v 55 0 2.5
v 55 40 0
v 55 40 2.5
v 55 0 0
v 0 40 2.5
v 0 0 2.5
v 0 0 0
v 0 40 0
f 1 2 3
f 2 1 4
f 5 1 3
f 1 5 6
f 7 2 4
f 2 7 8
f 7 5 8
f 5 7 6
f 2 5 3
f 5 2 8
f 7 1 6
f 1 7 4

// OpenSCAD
// v111 lid, broken (issue #436): the declared stack is 3.5 mm, but the rim
// strips were discarded by difference(), so only the 2.5 mm plate renders.
lid_base_thickness = 1.5;
rim_drop = 1.0;
skirt_height = 1.0;
lid_base = lid_base_thickness + rim_drop;
total_height = lid_base + skirt_height;

difference() {
  cube([55, 40, lid_base]);
  translate([0, 0, lid_base]) cube([55, 40, skirt_height]);
}
